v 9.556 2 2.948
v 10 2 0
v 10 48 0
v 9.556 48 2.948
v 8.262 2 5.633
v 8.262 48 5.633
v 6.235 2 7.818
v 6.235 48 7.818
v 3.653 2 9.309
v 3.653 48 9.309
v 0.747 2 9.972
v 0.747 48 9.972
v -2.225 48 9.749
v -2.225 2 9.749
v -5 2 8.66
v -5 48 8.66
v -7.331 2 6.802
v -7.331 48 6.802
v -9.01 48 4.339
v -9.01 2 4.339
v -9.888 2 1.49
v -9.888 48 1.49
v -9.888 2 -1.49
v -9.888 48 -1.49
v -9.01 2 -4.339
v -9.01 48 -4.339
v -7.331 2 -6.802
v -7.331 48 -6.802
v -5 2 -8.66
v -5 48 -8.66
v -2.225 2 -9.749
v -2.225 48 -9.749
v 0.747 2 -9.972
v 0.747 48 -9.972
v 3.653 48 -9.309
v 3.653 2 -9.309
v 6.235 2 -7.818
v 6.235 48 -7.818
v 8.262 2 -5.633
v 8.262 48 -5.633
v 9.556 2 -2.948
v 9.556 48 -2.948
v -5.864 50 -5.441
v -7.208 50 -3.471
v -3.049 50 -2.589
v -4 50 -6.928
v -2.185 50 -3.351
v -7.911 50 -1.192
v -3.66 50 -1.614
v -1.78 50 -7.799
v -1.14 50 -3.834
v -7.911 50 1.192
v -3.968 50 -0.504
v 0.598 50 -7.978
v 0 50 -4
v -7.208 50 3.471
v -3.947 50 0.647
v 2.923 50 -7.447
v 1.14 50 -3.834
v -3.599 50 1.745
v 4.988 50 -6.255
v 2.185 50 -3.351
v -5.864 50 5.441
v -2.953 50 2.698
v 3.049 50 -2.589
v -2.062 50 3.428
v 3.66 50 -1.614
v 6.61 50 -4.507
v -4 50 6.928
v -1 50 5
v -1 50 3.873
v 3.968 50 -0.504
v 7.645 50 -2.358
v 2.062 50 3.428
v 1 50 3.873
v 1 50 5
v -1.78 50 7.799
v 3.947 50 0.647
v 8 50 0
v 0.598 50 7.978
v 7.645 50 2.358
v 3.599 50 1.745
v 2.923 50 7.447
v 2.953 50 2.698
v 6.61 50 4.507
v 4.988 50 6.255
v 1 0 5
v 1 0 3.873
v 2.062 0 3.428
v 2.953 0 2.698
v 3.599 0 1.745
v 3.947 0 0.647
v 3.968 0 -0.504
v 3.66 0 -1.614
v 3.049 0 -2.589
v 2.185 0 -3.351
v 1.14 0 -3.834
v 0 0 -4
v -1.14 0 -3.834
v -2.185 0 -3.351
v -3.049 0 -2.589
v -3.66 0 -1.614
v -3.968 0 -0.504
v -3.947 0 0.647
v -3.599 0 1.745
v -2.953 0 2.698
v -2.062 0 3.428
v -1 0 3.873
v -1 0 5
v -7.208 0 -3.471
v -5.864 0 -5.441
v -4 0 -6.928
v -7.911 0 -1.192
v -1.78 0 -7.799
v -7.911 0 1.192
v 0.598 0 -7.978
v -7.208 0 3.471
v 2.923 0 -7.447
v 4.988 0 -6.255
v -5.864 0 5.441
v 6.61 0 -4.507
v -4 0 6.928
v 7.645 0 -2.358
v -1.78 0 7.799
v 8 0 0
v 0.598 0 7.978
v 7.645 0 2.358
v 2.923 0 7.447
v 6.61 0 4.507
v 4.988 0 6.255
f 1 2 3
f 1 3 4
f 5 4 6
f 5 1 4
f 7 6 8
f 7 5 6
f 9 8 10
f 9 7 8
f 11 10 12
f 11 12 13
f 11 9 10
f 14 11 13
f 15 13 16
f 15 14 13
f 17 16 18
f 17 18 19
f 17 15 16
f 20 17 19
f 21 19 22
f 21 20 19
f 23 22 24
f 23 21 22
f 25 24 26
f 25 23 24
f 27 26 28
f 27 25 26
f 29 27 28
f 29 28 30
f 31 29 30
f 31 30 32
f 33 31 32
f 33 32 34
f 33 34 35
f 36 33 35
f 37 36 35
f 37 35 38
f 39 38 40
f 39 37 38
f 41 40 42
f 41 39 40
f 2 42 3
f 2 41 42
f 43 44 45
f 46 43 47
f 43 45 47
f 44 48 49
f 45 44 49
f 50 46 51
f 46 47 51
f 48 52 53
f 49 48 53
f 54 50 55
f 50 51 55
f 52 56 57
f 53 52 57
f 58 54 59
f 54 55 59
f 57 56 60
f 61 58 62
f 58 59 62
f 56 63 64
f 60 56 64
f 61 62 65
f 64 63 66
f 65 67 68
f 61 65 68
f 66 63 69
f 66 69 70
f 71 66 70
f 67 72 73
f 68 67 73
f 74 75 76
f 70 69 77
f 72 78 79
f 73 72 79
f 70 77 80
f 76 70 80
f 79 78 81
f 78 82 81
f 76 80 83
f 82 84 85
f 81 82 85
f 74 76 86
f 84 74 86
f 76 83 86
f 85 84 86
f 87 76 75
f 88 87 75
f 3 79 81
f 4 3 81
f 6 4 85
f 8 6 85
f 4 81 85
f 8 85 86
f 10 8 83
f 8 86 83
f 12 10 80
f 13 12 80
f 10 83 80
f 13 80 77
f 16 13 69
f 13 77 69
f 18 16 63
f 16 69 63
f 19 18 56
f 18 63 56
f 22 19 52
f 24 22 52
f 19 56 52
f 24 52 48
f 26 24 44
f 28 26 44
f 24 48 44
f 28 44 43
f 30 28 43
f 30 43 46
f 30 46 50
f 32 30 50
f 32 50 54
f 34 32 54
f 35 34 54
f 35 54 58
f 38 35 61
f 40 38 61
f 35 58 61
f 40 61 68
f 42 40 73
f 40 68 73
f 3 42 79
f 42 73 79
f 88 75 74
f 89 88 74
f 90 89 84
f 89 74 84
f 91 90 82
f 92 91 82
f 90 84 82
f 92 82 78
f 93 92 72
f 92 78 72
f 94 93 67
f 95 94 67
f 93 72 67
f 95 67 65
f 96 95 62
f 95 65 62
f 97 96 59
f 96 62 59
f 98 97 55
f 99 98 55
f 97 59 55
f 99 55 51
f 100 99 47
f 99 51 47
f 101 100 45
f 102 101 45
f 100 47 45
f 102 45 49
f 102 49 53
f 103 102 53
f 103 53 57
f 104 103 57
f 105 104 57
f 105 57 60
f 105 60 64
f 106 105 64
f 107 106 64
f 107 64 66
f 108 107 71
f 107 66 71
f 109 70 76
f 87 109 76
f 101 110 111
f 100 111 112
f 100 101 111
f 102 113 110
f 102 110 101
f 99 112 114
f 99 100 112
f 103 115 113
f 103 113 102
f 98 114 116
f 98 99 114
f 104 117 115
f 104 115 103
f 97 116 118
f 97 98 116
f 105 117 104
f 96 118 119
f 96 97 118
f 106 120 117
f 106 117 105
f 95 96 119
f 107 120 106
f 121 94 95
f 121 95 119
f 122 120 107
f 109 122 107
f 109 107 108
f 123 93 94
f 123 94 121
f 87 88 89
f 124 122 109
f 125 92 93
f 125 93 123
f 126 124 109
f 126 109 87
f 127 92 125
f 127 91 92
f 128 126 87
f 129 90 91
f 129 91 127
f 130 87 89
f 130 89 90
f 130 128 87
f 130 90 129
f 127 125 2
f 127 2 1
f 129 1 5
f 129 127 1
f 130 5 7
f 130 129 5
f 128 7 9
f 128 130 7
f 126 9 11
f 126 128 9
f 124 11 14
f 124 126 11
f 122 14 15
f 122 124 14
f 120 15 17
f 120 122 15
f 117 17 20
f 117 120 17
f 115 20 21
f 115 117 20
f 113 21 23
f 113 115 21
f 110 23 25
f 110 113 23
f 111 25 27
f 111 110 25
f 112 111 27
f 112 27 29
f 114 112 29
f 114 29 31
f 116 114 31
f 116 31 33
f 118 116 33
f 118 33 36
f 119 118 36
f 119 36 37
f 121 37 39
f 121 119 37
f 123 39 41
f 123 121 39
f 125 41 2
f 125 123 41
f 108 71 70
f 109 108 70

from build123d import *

# Parameters (mm, degrees)
F0_R     = 10
F1_DEPTH = 50
F2_SIZE  = 2
F4_DEPTH = 50


with BuildPart() as f1:
    # F0 (on Front) → F1 (new body)
    with BuildSketch(Plane.XZ):
        Circle(F0_R)
    extrude(amount=-F1_DEPTH)

    # F2
    f2_edges = [f1.edges().sort_by_distance(p)[0] for p in [
        (-10, 50, 0),
        (-10, 0, 0),
    ]]
    chamfer(f2_edges, length=F2_SIZE)

    # F3 (on face) → F4 (cut, through all)
    with BuildSketch(Plane(origin=(0, 50, 0), x_dir=(-1, 0, 0), z_dir=(0, 1, 0))):
        with BuildLine():
            Line((-1, 5), (-1, 3.872983))
            ThreePointArc((-1, 3.872983), (0, -4), (1, 3.872983))
            Line((1, 3.872983), (1, 5))
            Line((1, 5), (-1, 5))
        make_face()
    extrude(amount=-F4_DEPTH, mode=Mode.SUBTRACT)


solid = f1.part
